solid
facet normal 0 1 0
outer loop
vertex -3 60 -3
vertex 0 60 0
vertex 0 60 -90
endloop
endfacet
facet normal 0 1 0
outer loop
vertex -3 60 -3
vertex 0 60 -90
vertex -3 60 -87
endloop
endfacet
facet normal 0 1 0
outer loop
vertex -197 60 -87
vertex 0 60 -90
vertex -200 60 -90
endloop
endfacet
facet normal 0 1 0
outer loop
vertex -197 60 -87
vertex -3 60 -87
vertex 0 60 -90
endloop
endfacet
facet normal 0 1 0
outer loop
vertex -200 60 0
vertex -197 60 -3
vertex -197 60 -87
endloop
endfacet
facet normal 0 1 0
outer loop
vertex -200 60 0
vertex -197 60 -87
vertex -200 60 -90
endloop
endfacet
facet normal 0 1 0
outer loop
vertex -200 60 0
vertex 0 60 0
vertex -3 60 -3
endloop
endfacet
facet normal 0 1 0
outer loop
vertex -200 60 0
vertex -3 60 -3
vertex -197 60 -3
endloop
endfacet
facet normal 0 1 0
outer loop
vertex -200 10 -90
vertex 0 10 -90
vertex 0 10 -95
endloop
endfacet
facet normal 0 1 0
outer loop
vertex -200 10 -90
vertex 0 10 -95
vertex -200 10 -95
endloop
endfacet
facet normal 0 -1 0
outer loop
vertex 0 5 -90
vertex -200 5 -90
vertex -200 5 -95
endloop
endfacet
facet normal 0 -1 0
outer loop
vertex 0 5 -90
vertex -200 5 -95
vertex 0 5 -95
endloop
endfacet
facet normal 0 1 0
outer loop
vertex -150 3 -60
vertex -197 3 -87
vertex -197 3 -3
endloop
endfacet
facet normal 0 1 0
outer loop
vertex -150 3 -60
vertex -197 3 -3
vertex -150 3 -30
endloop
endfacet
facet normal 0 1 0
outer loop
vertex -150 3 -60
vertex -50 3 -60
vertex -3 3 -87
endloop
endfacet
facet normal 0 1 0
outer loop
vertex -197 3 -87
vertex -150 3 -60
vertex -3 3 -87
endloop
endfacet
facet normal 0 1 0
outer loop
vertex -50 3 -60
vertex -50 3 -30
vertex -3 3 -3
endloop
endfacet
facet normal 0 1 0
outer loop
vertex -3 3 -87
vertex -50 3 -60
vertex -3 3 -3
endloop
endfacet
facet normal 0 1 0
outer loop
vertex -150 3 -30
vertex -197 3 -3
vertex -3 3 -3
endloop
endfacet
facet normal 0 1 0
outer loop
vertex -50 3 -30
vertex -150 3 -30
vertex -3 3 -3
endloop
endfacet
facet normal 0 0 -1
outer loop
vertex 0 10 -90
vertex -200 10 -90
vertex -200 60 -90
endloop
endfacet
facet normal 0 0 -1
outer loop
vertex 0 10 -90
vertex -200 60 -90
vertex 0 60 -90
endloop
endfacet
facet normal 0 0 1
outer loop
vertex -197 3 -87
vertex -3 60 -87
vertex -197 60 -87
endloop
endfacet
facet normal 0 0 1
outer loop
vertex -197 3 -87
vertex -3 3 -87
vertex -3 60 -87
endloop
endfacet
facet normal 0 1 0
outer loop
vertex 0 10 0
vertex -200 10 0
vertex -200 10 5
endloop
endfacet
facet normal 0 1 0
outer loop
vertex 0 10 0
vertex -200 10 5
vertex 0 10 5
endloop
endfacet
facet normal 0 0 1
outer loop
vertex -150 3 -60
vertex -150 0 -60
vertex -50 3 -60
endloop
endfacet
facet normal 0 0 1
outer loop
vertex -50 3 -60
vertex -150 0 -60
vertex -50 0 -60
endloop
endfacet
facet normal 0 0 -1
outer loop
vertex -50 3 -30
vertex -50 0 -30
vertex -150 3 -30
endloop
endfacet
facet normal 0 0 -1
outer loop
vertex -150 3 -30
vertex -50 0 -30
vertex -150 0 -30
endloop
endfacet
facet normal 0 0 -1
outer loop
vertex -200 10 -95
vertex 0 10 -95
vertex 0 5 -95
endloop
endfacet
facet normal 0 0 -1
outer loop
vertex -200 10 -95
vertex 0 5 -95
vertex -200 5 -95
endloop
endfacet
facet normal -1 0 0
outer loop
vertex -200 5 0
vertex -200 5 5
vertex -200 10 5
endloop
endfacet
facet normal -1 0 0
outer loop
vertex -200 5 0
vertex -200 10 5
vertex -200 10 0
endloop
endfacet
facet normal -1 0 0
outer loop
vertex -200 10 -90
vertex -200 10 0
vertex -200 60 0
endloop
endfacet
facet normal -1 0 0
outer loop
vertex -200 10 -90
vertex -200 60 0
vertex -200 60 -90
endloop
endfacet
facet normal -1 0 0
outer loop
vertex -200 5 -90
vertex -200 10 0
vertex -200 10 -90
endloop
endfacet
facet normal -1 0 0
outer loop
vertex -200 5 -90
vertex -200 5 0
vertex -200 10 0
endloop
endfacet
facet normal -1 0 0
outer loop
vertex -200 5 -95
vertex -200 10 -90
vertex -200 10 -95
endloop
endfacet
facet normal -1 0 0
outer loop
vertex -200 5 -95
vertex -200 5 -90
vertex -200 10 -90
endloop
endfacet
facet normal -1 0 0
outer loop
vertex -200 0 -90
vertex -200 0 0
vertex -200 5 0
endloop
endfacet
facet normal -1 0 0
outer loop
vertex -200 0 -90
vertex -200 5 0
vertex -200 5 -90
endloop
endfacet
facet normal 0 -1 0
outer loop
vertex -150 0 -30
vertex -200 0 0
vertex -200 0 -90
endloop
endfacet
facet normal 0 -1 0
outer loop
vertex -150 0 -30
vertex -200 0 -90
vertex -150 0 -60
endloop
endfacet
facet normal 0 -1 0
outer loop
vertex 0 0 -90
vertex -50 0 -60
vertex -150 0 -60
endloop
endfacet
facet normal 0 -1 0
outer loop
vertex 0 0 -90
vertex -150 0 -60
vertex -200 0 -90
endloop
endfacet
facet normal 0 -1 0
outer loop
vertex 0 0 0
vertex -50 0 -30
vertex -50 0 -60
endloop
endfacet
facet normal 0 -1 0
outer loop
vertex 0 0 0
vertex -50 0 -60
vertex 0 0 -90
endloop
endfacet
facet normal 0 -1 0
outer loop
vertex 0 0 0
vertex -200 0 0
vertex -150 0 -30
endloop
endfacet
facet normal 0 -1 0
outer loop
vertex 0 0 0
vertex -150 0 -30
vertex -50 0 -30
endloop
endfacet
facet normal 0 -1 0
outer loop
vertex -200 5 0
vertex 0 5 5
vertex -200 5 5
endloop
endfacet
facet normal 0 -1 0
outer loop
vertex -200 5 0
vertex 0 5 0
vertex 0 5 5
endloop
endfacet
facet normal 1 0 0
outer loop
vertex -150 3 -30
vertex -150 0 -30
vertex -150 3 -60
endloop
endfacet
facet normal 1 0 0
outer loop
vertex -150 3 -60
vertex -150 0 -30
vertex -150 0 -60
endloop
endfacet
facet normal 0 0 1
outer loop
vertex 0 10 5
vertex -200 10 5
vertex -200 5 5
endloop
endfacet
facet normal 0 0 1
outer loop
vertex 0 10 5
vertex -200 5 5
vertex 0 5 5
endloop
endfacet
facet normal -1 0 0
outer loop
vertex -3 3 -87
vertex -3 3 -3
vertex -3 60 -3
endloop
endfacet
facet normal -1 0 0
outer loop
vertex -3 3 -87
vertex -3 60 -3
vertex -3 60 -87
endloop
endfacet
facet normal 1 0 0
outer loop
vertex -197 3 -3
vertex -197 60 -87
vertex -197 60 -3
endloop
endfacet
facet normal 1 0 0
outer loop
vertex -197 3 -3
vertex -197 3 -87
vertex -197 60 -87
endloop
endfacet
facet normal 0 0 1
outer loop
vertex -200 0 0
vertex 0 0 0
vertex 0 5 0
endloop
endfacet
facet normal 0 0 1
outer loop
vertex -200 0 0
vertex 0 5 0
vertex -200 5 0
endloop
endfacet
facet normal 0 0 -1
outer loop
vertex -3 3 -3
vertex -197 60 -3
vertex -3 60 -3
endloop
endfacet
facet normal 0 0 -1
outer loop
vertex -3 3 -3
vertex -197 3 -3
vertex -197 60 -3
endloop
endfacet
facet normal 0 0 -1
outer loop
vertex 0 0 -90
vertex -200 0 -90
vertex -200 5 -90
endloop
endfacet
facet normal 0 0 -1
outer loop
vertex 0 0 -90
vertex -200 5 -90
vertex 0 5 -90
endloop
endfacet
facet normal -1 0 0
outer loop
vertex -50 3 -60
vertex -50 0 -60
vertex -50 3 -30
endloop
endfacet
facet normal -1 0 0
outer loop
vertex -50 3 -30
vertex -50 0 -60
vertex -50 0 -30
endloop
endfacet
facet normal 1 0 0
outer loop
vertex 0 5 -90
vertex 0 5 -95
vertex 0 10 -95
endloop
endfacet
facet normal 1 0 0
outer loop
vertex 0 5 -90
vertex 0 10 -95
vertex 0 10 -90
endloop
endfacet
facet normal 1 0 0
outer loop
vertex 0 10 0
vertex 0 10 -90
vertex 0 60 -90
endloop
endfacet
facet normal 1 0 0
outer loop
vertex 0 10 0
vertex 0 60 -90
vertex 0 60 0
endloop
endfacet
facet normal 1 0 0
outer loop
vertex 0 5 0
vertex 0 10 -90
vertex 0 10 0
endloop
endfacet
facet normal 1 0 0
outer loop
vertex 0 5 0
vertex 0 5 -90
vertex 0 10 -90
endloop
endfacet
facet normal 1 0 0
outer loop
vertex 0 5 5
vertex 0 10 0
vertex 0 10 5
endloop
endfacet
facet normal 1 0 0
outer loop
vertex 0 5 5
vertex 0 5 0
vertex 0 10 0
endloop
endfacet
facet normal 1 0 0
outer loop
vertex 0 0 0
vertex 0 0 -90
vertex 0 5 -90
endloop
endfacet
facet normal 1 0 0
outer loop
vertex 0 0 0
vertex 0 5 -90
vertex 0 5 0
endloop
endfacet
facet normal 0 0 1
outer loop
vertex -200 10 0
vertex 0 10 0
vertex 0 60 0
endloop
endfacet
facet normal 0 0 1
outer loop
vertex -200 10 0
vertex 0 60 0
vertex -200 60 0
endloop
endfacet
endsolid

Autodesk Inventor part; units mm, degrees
ref_plane "YZ Plane" through (0, 0, 0) normal (1, 0, 0) x (0, 1, 0)
ref_plane "XZ Plane" through (0, 0, 0) normal (0, 1, 0) x (-1, 0, 0)
ref_plane "XY Plane" through (0, 0, 0) normal (0, 0, 1) x (1, 0, 0)
sketch "Sketch1" plane through (0, 0, 0) normal (0, 1, 0) x (-1, 0, 0)
  line L0 (0, 0) -> (200, 0)
  line L1 (200, 0) -> (200, -90)
  line L2 (200, -90) -> (0, -90)
  line L3 (0, -90) -> (0, 0)
  line L4 (197, -87) -> (197, -3)
  line L5 (197, -3) -> (3, -3)
  line L6 (3, -3) -> (3, -87)
  line L7 (3, -87) -> (197, -87)
  dimension "d0" = 200
  dimension "d1" = 90
  dimension "d2" = 3
extrude "Extrusion1" add sketch "Sketch1" along normal blind 60
sketch "Sketch2" plane through (-200, 0, 0) normal (0, 0, 1) x (1, 0, 0)
  line L0 (0, 0) -> (0, 60) projected
  line L1 (200, 0) -> (200, 60) projected
  line L2 (0, 10) -> (200, 10)
  line L3 (200, 10) -> (200, 5)
  line L4 (200, 5) -> (0, 5)
  line L5 (0, 5) -> (0, 10)
  line L6 (0, 0) -> (200, 0) projected
  point P0 (0, 5)
  dimension "d5" = 5
  dimension "d6" = 5
extrude "Extrusion2" add sketch "Sketch2" along normal blind 5 contours L0 L2 L1 L4
sketch "Sketch3" plane through (0, 0, -90) normal (0, 0, -1) x (-1, 0, 0)
  line L0 (0, 0) -> (0, 60) projected
  line L1 (200, 0) -> (200, 60) projected
  line L2 (0, 10) -> (200, 10)
  line L3 (200, 10) -> (200, 5)
  line L4 (200, 5) -> (0, 5)
  line L5 (0, 5) -> (0, 10)
  line L6 (0, 0) -> (200, 0) projected
  point P0 (0, 5)
  dimension "d9" = 5
  dimension "d10" = 5
extrude "Extrusion3" add sketch "Sketch3" along normal blind 5 contours L0 L2 L1 L4
sketch "Sketch4" plane through (0, 0, 0) normal (0, -1, 0) x (1, 0, 0)
  line L0 (-197, -3) -> (-197, -87) projected
  line L1 (-3, -3) -> (-197, -3)
  line L2 (-197, -3) -> (-197, -87)
  line L3 (-197, -87) -> (-3, -87)
  line L4 (-3, -87) -> (-3, -3)
  line L5 (-50, -30) -> (-150, -30)
  line L6 (-150, -30) -> (-150, -60)
  line L7 (-150, -60) -> (-50, -60)
  line L8 (-50, -60) -> (-50, -30)
  line L9 (-200, -90) -> (-200, 0) projected
  line L10 (-200, 0) -> (0, 0) projected
  dimension "d13" = 100
  dimension "d14" = 30
  dimension "d16" = 50
  dimension "d17" = 30
extrude "Extrusion4" add sketch "Sketch4" against normal blind 3
properties part number "caja de mascarilllas"
